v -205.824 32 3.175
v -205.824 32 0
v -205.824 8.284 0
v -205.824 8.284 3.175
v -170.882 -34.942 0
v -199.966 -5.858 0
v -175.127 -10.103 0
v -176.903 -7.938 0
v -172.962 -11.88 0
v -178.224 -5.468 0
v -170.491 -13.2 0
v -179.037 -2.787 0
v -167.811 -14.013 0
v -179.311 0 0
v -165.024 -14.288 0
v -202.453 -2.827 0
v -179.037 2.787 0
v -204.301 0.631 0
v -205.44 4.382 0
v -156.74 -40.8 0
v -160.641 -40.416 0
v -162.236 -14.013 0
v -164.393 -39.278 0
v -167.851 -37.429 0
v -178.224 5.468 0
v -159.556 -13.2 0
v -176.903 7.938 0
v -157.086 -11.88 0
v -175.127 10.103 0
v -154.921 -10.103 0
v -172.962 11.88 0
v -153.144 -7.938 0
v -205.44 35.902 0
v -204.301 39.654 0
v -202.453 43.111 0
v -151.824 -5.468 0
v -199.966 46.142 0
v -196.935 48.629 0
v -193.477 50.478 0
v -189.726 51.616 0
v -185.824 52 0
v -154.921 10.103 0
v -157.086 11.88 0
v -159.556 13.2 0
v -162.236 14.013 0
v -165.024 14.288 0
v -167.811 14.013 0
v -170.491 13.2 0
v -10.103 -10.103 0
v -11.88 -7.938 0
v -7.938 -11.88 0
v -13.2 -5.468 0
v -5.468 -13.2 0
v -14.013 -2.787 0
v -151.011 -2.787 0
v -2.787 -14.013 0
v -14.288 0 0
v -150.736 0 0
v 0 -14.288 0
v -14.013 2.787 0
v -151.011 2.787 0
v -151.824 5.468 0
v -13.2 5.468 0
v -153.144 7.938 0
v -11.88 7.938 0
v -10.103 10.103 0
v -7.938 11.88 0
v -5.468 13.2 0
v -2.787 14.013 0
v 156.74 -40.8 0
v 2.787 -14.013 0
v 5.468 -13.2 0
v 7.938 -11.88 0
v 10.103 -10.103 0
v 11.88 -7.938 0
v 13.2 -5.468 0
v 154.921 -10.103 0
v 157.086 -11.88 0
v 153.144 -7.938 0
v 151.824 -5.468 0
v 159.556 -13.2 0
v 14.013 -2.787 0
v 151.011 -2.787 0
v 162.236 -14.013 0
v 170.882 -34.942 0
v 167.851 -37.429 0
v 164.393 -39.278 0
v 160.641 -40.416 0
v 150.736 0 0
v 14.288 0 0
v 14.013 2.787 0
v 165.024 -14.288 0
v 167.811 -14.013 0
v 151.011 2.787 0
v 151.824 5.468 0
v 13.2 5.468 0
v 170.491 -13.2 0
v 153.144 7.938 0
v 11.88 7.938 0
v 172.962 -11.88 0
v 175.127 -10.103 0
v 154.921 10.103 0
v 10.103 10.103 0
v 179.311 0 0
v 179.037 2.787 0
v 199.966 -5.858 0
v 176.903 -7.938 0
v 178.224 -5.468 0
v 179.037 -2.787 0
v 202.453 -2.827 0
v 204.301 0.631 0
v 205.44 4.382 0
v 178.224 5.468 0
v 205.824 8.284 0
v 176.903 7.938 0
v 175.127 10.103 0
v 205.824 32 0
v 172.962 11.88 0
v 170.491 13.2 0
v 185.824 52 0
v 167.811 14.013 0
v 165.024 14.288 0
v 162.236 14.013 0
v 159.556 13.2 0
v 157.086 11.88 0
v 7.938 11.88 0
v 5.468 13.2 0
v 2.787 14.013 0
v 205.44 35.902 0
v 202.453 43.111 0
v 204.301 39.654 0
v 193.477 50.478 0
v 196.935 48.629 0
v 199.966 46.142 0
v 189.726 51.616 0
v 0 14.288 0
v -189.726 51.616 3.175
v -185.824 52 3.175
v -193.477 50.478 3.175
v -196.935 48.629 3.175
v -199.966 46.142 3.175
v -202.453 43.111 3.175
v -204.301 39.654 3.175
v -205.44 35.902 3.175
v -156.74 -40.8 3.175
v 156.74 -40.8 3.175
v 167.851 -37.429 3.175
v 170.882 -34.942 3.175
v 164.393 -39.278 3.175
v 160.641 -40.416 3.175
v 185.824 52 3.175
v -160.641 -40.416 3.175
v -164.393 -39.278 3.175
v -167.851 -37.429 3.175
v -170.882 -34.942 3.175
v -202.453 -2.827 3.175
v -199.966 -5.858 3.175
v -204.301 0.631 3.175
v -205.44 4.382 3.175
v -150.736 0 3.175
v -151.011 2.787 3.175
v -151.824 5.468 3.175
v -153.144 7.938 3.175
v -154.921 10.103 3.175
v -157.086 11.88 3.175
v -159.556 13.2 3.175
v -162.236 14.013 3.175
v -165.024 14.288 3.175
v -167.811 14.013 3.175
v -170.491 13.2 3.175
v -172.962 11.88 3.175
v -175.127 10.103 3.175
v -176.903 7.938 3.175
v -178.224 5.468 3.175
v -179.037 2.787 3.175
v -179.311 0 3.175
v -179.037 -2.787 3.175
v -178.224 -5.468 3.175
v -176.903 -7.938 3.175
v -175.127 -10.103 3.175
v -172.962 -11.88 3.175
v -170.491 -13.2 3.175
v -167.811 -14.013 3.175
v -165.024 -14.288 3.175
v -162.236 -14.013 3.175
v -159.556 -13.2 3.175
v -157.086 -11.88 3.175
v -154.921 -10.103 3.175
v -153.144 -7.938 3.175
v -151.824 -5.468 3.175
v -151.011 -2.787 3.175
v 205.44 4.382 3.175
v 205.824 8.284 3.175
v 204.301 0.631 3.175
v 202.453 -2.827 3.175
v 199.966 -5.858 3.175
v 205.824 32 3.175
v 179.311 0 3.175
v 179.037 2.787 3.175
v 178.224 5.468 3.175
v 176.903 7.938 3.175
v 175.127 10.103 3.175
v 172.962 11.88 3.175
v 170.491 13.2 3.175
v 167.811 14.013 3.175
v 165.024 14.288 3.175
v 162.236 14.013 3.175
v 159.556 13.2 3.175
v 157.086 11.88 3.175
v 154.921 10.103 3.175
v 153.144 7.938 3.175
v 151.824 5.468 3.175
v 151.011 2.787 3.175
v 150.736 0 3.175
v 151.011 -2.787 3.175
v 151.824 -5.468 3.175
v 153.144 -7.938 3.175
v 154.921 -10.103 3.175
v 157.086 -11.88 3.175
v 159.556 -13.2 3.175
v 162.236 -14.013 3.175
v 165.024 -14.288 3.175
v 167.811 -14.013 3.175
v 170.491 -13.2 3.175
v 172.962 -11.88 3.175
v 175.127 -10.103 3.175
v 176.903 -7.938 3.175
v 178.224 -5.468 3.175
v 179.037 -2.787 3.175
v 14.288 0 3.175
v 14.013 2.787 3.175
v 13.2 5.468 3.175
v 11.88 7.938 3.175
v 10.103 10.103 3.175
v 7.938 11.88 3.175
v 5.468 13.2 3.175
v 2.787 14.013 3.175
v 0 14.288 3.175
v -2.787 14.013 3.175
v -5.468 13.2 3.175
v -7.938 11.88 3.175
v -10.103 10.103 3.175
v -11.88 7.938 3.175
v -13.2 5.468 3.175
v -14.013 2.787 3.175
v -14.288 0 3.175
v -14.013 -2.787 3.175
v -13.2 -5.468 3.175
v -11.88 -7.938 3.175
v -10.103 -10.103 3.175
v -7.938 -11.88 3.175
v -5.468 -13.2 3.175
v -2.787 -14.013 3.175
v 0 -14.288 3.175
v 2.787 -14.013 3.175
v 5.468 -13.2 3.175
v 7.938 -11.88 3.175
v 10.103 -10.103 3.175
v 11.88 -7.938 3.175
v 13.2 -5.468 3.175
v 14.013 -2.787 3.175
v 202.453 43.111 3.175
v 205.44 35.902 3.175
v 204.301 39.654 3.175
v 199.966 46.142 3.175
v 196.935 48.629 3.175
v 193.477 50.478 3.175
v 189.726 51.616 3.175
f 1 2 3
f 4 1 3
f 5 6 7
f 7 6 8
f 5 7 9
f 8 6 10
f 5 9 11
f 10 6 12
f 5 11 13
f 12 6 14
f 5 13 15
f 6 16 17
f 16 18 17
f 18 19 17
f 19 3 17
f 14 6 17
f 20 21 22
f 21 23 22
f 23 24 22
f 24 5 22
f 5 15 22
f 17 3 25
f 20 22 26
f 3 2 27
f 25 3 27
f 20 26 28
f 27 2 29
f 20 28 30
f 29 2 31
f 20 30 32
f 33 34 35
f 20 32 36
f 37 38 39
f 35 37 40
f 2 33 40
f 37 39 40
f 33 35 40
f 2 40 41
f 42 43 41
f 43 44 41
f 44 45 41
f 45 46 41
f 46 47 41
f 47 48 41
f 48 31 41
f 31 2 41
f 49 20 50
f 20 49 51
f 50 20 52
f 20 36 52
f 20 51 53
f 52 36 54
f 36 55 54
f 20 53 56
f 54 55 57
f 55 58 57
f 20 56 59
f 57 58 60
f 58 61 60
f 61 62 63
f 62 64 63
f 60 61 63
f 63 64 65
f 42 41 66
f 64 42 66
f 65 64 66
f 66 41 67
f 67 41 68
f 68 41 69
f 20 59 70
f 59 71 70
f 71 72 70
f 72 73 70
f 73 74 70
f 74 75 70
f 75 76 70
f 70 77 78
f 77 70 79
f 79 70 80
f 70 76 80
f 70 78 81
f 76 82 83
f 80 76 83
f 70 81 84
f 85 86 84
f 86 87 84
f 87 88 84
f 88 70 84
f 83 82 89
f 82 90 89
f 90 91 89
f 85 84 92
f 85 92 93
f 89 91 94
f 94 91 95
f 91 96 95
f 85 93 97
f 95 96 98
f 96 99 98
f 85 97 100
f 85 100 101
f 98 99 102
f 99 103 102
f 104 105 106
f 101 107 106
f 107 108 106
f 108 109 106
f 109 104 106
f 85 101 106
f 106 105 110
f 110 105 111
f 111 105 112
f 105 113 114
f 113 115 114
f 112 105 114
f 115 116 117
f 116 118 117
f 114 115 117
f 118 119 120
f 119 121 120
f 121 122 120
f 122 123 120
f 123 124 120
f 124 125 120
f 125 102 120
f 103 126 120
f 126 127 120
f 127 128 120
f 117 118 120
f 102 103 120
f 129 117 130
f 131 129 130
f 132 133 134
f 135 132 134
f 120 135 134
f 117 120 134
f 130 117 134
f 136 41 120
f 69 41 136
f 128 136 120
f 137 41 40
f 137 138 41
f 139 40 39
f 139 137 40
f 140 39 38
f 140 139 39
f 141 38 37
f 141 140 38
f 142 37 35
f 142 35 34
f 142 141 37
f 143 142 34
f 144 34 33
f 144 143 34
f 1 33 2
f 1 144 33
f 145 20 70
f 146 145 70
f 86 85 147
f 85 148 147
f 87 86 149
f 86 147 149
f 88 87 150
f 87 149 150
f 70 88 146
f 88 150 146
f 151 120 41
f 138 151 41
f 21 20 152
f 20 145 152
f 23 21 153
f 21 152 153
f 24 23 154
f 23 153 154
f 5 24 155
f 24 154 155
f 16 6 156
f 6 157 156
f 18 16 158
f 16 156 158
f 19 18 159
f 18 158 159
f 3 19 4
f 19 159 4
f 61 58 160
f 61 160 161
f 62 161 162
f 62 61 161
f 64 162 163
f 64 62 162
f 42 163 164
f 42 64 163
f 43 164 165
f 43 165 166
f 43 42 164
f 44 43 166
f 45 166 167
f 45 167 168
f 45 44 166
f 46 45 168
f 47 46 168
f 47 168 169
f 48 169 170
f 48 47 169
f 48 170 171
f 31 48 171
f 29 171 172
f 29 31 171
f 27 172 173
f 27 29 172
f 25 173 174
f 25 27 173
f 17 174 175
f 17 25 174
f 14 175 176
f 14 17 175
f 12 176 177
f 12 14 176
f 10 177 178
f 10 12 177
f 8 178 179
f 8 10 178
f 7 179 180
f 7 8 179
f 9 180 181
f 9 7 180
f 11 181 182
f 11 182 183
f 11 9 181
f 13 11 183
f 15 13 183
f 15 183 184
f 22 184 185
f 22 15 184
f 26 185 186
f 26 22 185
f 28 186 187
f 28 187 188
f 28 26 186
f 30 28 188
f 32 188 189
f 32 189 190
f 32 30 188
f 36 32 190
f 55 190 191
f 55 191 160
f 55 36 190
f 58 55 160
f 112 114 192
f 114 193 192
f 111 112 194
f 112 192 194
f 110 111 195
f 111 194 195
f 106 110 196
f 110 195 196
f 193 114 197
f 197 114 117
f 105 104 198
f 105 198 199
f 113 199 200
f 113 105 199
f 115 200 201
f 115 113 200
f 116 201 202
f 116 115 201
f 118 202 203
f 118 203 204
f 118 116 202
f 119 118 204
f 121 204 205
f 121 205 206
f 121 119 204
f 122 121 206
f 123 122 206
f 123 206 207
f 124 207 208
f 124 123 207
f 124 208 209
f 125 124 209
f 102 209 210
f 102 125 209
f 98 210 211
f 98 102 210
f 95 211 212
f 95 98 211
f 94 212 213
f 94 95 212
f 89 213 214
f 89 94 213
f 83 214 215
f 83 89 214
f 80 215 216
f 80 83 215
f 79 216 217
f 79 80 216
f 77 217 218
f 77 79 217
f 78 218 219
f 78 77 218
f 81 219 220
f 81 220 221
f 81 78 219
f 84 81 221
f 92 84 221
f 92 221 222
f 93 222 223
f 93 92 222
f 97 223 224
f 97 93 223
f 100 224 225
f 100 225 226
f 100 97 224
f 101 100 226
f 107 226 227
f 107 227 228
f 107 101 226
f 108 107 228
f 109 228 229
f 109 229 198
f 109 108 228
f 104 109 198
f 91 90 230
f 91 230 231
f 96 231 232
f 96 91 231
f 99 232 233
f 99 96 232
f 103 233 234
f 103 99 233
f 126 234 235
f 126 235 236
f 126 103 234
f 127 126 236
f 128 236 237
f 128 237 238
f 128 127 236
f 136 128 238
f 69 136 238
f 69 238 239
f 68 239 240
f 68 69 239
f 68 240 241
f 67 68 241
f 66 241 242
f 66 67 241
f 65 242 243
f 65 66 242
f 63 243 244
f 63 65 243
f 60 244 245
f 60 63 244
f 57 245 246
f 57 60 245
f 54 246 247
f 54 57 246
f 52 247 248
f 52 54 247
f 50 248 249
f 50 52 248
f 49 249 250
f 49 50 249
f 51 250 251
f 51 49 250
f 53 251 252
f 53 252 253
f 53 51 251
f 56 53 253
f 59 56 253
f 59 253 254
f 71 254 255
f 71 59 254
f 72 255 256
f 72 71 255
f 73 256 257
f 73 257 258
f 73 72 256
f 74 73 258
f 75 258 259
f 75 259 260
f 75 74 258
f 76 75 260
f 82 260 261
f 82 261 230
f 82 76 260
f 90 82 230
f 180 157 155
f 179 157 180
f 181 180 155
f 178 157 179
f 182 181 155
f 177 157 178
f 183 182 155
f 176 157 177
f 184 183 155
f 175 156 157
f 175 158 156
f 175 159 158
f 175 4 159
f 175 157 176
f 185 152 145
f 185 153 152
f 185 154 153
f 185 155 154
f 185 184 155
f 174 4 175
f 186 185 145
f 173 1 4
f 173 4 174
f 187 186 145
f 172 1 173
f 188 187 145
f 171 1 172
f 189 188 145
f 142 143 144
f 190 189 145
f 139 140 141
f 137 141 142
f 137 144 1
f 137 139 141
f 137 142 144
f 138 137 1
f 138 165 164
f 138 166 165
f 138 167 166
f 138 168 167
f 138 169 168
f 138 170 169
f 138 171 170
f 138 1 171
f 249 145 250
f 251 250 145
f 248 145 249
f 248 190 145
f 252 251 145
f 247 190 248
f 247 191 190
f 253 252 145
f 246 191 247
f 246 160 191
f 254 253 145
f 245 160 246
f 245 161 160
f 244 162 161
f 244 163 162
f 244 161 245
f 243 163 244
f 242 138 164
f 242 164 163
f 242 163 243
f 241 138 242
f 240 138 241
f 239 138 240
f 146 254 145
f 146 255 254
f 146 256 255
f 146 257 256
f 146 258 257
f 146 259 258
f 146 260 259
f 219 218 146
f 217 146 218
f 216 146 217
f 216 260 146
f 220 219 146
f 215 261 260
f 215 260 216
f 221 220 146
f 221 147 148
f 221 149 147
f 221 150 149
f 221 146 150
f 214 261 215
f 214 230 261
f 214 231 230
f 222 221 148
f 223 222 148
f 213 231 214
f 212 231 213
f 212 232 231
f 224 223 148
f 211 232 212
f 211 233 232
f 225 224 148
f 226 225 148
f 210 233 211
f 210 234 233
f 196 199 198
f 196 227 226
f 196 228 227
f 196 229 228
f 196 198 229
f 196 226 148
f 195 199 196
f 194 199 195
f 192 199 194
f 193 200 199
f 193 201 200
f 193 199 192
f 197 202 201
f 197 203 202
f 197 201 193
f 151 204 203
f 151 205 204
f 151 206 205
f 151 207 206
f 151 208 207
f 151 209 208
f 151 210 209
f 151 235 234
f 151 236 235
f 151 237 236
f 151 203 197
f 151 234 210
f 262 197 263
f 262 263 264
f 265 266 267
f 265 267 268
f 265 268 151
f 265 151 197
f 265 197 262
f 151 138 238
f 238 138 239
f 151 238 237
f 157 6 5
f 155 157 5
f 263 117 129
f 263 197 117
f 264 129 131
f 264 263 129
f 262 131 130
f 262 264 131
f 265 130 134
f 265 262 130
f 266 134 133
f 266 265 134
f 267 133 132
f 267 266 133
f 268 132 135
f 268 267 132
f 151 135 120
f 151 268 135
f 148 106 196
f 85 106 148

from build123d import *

# Parameters (mm, degrees)
SKETCH1_R           = 14.2875
BOSS_EXTRUDE1_DEPTH = 3.175
FILLET1_R           = 20
FILLET2_R           = 20


with BuildPart() as part:
    # Sketch1 → Boss-Extrude1 (new body)
    with BuildSketch(Plane.XY):
        with BuildLine():
            Line((-205.8238, 0), (-165.0238, -40.8))
            ThreePointArc((-165.0238, -40.8), (-136.173843328, 28.849956672), (-205.8238, 0))
        make_face()
        with Locations((-165.0238, 0)):
            Circle(SKETCH1_R, mode=Mode.SUBTRACT)
        with BuildLine():
            ThreePointArc((-205.8238, 0), (-136.173843328, 28.849956672), (-165.0238, -40.8))
            Line((-165.0238, -40.8), (-134.758308099, -40.8))
            ThreePointArc((-134.758308099, -40.8), (-119.646895144, -22.838049517), (-114.2238, 0))
            ThreePointArc((-114.2238, 0), (-149.086422549, 48.235256815), (-205.8238, 30.265491901))
            Line((-205.8238, 30.265491901), (-205.8238, 0))
        make_face()
        with BuildLine():
            ThreePointArc((-114.2238, 0), (-119.646895144, -22.838049517), (-134.758308099, -40.8))
            Line((-134.758308099, -40.8), (-30.265491901, -40.8))
            ThreePointArc((-30.265491901, -40.8), (-22.838049517, 45.376904856), (50.8, 0))
            ThreePointArc((50.8, 0), (45.376904856, -22.838049517), (30.265491901, -40.8))
            Line((30.265491901, -40.8), (134.758308099, -40.8))
            ThreePointArc((134.758308099, -40.8), (129.102775516, 35.921024484), (205.8238, 30.265491901))
            Line((205.8238, 30.265491901), (205.8238, 52))
            Line((205.8238, 52), (-205.8238, 52))
            Line((-205.8238, 52), (-205.8238, 30.265491901))
            ThreePointArc((-205.8238, 30.265491901), (-149.086422549, 48.235256815), (-114.2238, 0))
        make_face()
        with BuildLine():
            ThreePointArc((50.8, 0), (-22.838049517, 45.376904856), (-30.265491901, -40.8))
            Line((-30.265491901, -40.8), (30.265491901, -40.8))
            ThreePointArc((30.265491901, -40.8), (45.376904856, -22.838049517), (50.8, 0))
        make_face()
        Circle(SKETCH1_R, mode=Mode.SUBTRACT)
        with BuildLine():
            Line((205.8238, 0), (165.0238, -40.8))
            ThreePointArc((165.0238, -40.8), (136.173843328, 28.849956672), (205.8238, 0))
        make_face()
        with Locations((165.0238, 0)):
            Circle(SKETCH1_R, mode=Mode.SUBTRACT)
        with BuildLine():
            ThreePointArc((205.8238, 30.265491901), (129.102775516, 35.921024484), (134.758308099, -40.8))
            Line((134.758308099, -40.8), (165.0238, -40.8))
            ThreePointArc((165.0238, -40.8), (136.173843328, 28.849956672), (205.8238, 0))
            Line((205.8238, 0), (205.8238, 30.265491901))
        make_face()
    extrude(amount=BOSS_EXTRUDE1_DEPTH)

    # Fillet1
    fillet1_edges = [part.edges().sort_by_distance(p)[0] for p in [
        (-205.8238, 52, 1.5875),
        (205.8238, 52, 1.5875),
    ]]
    fillet(fillet1_edges, radius=FILLET1_R)

    # Fillet2
    fillet2_edges = [part.edges().sort_by_distance(p)[0] for p in [
        (-205.8238, 0, 1.5875),
        (205.8238, 0, 1.5875),
        (165.0238, -40.8, 1.5875),
        (-165.0238, -40.8, 1.5875),
    ]]
    fillet(fillet2_edges, radius=FILLET2_R)


solid = part.part
